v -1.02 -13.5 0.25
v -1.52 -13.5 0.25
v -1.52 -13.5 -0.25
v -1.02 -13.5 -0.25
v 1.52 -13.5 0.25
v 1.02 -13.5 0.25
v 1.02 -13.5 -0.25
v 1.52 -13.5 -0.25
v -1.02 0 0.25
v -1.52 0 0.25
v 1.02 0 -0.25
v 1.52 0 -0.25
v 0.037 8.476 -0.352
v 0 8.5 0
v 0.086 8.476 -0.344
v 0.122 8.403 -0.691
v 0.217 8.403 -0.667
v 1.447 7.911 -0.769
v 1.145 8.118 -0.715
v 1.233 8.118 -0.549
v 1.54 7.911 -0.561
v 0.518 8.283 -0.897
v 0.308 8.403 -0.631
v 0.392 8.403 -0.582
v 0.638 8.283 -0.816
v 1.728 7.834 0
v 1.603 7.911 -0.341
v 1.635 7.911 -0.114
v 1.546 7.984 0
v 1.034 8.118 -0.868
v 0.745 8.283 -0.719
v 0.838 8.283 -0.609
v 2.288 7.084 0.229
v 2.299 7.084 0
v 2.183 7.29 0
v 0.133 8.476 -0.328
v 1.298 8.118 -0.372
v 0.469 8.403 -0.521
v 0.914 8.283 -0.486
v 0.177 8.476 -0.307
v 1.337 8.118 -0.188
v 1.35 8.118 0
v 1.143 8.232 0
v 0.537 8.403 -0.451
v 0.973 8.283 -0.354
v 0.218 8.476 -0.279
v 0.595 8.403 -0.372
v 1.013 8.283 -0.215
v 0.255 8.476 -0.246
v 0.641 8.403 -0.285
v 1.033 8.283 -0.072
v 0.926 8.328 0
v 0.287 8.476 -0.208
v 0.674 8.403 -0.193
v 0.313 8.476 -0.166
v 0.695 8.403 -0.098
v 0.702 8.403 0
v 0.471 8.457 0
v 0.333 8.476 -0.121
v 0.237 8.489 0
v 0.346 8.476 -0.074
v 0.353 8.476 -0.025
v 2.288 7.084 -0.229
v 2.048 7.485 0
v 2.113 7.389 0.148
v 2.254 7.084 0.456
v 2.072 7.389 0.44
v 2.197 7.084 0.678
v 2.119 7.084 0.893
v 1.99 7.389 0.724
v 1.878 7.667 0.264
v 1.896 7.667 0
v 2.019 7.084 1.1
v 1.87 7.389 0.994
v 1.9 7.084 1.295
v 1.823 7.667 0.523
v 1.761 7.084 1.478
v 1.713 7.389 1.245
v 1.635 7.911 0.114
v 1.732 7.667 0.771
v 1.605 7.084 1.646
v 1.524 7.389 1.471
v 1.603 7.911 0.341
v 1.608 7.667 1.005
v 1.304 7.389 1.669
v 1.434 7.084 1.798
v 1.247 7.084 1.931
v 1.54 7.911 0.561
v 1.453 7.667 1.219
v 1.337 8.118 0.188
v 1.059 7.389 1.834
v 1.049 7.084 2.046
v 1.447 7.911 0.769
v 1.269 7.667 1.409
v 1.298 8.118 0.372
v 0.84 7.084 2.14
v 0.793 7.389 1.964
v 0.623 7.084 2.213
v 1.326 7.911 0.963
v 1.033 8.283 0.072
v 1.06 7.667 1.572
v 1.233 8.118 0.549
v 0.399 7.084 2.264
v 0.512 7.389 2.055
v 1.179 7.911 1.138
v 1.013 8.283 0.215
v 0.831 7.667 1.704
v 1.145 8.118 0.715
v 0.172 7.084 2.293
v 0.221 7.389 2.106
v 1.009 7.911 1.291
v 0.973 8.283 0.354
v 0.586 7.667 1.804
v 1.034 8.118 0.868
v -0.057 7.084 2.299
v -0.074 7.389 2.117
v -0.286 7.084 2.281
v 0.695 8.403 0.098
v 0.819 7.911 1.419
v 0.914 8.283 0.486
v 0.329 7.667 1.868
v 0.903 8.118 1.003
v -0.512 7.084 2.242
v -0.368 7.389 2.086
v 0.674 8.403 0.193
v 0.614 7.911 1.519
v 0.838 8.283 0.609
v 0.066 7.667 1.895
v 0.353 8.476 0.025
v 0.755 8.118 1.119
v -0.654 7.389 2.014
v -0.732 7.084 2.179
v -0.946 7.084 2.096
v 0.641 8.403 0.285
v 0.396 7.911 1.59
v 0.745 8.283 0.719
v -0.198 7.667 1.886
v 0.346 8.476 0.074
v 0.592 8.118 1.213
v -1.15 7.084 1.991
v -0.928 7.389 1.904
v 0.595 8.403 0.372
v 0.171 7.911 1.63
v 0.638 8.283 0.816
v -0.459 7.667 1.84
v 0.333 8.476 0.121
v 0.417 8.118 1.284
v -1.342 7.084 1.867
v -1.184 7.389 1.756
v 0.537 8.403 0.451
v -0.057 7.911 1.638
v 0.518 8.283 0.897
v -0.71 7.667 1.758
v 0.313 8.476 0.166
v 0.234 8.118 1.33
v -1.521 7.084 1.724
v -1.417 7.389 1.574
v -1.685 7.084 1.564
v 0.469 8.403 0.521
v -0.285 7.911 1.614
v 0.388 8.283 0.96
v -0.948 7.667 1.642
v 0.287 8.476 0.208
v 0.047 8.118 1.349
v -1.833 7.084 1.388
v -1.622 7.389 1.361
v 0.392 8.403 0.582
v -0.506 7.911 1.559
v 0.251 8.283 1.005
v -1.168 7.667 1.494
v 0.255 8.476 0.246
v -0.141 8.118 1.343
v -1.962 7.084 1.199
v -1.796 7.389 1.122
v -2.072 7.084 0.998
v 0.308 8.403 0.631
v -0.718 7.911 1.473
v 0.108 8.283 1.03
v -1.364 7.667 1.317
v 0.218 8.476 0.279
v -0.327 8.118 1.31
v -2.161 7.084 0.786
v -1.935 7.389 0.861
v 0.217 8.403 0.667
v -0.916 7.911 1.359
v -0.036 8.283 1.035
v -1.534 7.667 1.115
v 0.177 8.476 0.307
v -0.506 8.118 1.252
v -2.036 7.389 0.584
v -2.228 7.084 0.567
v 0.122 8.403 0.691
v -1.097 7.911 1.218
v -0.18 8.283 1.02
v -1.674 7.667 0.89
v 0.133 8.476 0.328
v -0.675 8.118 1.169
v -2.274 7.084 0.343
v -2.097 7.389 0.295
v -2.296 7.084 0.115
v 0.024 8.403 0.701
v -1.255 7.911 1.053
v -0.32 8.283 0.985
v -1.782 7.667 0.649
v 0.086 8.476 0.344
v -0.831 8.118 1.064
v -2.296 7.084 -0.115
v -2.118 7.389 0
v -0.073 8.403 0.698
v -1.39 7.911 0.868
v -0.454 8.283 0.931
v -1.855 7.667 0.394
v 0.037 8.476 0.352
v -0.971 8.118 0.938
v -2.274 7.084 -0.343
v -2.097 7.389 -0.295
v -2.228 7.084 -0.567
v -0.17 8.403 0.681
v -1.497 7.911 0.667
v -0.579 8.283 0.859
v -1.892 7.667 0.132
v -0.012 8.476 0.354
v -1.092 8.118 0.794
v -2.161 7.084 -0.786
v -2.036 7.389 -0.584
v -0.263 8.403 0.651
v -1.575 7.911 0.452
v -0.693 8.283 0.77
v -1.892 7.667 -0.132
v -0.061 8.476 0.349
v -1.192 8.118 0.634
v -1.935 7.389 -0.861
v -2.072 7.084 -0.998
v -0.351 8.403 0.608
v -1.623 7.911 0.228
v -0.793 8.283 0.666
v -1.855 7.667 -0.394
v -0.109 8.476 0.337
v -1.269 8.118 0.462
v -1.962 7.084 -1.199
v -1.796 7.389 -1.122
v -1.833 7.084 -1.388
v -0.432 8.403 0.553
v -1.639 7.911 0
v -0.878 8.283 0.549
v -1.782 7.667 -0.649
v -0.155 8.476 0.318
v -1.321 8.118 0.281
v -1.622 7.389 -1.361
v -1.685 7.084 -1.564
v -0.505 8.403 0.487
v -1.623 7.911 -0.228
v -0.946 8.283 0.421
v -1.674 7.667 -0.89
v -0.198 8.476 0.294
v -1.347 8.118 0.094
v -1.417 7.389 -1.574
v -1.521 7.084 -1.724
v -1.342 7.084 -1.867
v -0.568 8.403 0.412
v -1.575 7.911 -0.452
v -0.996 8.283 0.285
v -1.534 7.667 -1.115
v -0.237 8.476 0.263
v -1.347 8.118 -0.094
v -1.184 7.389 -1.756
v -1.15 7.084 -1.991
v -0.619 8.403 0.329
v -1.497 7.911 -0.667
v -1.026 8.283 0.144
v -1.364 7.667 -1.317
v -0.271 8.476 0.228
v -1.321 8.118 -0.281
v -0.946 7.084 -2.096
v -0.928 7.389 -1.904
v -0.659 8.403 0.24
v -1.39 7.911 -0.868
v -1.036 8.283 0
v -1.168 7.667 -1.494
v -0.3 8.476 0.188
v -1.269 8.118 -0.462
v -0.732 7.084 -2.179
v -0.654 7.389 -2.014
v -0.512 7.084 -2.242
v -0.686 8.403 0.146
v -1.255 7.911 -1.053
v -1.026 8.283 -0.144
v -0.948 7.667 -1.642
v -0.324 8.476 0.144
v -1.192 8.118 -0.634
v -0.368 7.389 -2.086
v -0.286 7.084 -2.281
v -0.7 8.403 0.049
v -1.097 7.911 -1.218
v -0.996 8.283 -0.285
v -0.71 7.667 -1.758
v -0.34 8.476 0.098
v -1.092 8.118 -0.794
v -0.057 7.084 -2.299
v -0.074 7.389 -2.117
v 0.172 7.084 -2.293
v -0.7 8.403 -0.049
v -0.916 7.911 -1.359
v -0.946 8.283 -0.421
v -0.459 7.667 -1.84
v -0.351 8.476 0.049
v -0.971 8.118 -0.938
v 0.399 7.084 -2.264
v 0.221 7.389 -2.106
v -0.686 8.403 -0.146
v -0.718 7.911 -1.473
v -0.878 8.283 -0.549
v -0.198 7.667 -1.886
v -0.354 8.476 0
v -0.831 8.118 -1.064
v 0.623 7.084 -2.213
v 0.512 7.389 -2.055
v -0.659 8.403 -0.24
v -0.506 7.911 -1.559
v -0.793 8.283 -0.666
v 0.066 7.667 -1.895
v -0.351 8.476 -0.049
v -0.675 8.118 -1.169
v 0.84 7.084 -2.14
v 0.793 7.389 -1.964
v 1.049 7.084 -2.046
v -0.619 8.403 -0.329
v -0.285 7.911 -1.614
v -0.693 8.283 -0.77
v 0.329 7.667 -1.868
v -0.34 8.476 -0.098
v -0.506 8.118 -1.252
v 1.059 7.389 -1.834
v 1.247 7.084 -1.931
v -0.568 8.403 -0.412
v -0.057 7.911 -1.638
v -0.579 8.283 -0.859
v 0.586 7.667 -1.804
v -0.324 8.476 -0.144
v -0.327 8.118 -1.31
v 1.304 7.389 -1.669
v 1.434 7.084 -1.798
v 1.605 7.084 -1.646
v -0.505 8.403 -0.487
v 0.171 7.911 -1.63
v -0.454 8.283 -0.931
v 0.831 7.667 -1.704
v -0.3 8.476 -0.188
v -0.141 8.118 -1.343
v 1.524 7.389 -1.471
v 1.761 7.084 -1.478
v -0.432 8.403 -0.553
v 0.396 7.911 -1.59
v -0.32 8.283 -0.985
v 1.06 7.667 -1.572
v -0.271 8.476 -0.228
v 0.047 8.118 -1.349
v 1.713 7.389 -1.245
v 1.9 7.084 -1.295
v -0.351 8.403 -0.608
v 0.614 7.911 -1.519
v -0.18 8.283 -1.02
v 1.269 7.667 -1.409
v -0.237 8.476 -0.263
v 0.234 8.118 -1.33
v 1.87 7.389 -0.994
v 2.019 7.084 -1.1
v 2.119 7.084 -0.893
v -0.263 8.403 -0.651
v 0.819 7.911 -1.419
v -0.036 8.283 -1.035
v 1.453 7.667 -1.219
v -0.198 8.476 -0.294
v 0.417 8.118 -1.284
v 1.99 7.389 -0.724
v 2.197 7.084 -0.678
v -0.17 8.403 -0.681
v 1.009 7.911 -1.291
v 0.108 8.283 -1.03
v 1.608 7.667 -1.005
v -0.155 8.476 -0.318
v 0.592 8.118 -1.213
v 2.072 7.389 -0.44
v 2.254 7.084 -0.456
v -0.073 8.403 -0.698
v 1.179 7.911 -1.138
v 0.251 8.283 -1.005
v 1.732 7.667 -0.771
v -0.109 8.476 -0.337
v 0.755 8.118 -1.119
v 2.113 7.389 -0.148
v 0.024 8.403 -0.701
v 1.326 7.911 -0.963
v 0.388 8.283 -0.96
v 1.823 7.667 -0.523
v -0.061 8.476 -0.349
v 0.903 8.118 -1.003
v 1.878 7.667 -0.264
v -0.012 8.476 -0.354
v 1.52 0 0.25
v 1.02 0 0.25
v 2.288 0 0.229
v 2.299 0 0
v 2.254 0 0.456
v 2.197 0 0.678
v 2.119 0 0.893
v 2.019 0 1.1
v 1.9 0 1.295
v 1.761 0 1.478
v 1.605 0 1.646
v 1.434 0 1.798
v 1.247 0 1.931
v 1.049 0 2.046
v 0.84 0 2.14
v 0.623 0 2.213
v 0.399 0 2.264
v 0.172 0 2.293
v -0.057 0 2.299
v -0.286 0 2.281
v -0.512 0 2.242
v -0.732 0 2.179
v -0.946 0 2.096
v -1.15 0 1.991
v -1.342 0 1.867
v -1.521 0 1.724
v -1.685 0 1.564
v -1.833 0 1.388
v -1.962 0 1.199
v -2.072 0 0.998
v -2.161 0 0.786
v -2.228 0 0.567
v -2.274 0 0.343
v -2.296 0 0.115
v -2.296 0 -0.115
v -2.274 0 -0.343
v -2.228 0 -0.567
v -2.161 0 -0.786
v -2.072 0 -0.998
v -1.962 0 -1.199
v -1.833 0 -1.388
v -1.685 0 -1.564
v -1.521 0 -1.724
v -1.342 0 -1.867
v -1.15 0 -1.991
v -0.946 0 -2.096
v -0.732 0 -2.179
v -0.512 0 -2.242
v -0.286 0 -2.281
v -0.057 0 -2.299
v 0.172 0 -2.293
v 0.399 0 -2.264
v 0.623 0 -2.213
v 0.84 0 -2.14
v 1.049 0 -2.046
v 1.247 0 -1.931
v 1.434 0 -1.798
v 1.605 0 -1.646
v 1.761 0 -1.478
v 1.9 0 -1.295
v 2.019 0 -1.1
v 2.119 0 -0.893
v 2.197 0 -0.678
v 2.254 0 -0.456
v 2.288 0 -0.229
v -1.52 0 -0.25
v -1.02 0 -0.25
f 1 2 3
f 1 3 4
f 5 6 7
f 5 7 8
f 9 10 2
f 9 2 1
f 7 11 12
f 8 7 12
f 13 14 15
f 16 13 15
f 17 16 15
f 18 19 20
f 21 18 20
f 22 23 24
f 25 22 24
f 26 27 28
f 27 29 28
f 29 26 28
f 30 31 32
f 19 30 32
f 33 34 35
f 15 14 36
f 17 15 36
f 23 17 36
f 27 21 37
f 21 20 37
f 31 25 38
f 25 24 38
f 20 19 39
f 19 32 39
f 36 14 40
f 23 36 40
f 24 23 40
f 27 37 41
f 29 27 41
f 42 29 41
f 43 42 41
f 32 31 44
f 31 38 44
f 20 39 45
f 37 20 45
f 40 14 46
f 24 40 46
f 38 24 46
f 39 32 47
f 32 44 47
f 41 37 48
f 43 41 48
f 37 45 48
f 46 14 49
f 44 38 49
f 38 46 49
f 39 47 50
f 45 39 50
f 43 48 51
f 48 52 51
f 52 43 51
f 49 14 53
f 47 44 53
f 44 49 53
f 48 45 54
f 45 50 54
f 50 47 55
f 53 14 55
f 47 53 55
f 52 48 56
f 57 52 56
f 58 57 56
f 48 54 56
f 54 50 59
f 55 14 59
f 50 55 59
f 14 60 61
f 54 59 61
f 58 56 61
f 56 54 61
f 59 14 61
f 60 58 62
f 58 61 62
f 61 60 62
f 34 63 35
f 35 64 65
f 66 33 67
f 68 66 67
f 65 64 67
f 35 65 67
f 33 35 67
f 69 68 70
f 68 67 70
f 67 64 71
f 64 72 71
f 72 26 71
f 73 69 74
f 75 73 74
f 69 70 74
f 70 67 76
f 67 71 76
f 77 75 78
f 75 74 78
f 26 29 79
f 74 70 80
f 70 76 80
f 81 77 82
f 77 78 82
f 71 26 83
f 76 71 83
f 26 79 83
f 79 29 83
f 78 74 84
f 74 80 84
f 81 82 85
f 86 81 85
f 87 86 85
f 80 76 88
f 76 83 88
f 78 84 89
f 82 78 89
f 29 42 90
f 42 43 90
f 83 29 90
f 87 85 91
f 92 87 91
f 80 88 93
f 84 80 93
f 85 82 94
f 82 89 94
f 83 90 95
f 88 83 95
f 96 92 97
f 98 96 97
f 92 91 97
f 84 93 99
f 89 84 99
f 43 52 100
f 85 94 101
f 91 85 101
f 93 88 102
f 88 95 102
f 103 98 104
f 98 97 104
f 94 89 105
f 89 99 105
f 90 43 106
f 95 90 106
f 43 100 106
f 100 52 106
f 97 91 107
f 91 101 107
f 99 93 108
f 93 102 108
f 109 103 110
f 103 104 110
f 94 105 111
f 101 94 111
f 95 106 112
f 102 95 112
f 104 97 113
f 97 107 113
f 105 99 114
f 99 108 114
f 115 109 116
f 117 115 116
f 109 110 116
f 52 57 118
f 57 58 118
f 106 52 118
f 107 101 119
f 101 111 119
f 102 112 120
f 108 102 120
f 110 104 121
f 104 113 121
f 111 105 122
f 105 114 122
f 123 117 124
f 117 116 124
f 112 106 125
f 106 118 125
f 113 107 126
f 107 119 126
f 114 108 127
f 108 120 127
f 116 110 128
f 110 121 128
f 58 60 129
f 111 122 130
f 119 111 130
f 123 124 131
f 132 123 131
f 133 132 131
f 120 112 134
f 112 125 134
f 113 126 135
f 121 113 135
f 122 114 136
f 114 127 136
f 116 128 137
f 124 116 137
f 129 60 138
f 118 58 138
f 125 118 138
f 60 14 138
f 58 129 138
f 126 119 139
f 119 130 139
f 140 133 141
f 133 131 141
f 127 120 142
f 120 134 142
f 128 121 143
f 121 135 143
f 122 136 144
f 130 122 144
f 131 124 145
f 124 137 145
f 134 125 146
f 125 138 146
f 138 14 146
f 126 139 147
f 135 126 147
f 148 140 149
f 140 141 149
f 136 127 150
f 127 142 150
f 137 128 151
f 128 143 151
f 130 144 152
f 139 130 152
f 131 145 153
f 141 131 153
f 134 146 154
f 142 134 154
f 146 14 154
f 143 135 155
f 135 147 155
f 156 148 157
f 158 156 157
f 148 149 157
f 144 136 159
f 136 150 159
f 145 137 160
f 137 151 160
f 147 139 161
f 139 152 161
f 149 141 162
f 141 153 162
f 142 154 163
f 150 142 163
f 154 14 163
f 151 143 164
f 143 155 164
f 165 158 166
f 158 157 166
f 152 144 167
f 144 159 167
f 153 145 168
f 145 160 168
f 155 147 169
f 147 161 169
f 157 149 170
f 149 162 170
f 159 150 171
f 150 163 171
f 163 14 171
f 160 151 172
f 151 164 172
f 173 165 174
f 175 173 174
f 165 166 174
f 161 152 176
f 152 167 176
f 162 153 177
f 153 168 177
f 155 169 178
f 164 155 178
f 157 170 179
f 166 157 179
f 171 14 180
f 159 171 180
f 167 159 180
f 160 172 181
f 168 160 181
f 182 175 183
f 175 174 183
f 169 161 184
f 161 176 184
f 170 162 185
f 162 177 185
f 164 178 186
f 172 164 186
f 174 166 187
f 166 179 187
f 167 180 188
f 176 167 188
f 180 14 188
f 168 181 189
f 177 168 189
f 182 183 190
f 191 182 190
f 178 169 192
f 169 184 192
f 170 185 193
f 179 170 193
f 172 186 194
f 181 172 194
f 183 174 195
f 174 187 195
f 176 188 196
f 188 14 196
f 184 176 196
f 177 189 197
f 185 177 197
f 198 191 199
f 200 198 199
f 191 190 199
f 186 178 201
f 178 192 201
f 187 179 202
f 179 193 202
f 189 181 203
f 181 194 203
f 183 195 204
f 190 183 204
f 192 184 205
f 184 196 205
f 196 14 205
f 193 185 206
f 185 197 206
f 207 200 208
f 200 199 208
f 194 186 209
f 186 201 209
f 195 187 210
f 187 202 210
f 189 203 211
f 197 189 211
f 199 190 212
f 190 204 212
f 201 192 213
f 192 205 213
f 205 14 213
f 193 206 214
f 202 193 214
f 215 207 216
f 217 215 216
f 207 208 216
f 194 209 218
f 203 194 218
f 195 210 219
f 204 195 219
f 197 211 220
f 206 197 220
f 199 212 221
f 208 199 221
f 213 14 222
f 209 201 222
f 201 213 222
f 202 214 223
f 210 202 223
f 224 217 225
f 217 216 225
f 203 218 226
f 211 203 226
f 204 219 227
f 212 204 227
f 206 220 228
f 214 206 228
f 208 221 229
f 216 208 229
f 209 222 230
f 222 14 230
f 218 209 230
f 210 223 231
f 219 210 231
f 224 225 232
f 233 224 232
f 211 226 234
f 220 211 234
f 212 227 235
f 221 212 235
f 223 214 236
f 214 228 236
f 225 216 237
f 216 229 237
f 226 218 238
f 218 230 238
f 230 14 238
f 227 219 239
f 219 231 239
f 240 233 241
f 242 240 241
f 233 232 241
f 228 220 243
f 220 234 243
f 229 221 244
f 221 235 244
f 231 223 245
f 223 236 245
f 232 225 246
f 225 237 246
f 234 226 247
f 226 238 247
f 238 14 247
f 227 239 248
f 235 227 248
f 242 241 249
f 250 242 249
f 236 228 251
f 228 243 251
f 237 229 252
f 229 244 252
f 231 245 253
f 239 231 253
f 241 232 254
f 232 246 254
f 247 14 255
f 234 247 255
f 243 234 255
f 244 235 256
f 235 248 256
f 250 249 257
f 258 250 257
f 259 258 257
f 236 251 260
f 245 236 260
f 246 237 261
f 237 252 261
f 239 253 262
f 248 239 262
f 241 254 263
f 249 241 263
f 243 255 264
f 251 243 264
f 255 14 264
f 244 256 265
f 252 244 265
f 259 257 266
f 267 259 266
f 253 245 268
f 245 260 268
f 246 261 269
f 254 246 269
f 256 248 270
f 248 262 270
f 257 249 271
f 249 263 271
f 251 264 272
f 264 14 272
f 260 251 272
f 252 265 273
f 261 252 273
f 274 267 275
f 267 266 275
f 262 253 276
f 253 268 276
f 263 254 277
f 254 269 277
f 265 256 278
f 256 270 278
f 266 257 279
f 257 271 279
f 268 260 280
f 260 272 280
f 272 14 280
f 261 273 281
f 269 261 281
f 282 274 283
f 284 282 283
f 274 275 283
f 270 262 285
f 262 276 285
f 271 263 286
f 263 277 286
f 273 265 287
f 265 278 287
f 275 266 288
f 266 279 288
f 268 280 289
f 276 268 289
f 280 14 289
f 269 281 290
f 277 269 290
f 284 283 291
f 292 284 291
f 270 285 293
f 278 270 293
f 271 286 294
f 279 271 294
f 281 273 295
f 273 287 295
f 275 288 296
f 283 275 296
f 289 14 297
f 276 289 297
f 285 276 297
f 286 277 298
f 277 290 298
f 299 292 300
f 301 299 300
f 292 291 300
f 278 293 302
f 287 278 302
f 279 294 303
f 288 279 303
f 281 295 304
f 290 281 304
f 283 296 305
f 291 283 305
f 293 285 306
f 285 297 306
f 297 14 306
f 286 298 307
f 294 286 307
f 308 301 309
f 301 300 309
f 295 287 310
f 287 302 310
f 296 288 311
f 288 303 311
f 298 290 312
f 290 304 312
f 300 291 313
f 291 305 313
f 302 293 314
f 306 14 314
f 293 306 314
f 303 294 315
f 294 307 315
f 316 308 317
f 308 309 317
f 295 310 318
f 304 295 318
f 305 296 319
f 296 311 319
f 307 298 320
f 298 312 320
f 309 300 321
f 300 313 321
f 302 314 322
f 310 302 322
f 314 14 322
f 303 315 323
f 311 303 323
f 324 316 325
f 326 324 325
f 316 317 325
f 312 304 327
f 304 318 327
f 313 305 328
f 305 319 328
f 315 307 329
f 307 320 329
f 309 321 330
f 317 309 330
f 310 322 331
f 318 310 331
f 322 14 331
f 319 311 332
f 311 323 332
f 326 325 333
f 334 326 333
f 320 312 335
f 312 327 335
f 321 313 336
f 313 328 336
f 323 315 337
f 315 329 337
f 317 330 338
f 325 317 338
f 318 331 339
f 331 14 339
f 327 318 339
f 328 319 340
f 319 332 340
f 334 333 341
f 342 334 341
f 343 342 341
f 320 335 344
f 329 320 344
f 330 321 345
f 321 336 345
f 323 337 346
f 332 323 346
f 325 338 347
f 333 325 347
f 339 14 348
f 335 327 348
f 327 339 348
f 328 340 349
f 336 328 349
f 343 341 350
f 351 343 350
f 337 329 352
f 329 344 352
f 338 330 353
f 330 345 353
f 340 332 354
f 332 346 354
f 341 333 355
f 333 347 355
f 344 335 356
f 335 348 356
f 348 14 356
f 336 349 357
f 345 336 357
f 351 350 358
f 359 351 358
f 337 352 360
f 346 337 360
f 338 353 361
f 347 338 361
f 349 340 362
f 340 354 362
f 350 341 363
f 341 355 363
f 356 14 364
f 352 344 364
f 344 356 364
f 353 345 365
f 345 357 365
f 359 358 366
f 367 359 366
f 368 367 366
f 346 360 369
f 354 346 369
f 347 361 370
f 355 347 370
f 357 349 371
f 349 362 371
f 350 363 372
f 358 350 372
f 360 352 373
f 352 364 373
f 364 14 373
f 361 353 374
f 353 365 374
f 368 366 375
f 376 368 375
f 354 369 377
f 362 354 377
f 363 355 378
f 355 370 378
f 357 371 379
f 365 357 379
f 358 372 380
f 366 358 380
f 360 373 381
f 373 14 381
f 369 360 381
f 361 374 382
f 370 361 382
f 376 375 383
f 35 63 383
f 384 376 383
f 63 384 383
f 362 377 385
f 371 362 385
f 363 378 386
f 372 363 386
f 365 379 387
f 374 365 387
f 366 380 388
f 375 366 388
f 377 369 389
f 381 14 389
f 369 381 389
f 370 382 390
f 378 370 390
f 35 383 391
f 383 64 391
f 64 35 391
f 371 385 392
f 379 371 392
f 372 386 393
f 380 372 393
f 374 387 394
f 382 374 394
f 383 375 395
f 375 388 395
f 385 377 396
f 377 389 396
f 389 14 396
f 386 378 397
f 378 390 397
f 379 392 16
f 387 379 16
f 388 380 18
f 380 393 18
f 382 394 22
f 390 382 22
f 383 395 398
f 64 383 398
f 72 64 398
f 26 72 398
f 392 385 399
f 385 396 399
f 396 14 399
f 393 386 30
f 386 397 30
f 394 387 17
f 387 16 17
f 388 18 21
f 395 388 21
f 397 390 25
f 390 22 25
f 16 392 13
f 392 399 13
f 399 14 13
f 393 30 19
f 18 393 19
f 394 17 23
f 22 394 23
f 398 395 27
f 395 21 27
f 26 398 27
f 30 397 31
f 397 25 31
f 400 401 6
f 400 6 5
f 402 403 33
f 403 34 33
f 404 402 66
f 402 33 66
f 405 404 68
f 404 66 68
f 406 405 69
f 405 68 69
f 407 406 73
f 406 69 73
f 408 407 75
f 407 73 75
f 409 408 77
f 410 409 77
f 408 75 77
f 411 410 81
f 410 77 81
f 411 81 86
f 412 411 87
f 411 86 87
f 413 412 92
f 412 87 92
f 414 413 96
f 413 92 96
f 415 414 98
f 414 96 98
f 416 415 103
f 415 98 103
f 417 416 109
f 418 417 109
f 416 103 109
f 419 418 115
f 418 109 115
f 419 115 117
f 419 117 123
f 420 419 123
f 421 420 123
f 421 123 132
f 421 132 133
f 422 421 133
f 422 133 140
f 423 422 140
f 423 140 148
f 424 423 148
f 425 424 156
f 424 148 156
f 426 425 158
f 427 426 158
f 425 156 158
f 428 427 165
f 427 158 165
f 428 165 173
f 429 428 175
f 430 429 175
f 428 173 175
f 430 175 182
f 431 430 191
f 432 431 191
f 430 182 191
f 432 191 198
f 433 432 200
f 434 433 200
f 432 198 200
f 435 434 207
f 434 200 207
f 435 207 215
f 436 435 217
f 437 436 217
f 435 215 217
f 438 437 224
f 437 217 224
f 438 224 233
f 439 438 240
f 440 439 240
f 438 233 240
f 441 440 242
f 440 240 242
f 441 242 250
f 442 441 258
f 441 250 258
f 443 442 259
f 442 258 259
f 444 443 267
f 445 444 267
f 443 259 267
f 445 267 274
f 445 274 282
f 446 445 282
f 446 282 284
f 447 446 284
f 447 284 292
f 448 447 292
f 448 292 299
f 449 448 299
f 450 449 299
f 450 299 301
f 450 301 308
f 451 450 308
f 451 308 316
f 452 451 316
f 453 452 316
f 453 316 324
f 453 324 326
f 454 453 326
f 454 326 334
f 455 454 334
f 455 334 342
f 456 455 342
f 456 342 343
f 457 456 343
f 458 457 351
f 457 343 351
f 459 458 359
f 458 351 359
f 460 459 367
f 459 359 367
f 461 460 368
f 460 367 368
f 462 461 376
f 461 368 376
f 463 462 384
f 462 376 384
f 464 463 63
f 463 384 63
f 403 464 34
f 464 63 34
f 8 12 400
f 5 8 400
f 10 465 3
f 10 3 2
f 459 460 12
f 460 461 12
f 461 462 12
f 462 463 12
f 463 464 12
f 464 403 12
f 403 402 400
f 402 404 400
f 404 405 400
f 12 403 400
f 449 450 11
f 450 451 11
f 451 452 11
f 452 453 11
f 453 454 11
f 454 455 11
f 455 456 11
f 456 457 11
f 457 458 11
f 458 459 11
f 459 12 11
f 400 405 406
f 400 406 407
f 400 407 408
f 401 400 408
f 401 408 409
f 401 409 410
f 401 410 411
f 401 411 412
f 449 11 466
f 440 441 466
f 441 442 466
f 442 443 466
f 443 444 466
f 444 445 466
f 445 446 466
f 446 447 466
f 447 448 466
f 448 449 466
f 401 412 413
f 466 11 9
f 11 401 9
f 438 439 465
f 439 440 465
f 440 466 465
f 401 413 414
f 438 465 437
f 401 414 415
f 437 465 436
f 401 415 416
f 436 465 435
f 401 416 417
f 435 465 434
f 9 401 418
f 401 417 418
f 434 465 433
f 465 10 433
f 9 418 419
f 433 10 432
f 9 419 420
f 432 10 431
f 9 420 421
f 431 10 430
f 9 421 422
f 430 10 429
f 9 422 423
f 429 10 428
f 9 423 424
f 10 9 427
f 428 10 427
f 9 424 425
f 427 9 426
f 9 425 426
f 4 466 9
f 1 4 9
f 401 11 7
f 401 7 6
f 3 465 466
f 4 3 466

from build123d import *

# Parameters (mm, degrees)
CROQUIS2_W              = 0.5
CROQUIS2_H              = 0.5
SALIENTE_EXTRUIR1_DEPTH = 13.5


with BuildPart() as part:
    # Croquis1 → Revolución1 (revolve)
    with BuildSketch(Plane.XY):
        with BuildLine():
            Line((0, 0), (2.299223692, 0))
            Line((2.299223692, 0), (2.299223692, 7.084178562))
            ThreePointArc((2.299223692, 7.084178562), (1.350090731, 8.117657033), (0, 8.5))
            Line((0, 8.5), (0, 0))
        make_face()
    revolve(axis=Axis((0, 8.5, 0), (0, -1, 0)))

    # Croquis2 → Saliente-Extruir1 (add)
    with BuildSketch(Plane.XZ):
        with Locations((1.27, 0)):
            Rectangle(CROQUIS2_W, CROQUIS2_H)
        with Locations((-1.27, 0)):
            Rectangle(CROQUIS2_W, CROQUIS2_H)
    extrude(amount=SALIENTE_EXTRUIR1_DEPTH)


solid = part.part
